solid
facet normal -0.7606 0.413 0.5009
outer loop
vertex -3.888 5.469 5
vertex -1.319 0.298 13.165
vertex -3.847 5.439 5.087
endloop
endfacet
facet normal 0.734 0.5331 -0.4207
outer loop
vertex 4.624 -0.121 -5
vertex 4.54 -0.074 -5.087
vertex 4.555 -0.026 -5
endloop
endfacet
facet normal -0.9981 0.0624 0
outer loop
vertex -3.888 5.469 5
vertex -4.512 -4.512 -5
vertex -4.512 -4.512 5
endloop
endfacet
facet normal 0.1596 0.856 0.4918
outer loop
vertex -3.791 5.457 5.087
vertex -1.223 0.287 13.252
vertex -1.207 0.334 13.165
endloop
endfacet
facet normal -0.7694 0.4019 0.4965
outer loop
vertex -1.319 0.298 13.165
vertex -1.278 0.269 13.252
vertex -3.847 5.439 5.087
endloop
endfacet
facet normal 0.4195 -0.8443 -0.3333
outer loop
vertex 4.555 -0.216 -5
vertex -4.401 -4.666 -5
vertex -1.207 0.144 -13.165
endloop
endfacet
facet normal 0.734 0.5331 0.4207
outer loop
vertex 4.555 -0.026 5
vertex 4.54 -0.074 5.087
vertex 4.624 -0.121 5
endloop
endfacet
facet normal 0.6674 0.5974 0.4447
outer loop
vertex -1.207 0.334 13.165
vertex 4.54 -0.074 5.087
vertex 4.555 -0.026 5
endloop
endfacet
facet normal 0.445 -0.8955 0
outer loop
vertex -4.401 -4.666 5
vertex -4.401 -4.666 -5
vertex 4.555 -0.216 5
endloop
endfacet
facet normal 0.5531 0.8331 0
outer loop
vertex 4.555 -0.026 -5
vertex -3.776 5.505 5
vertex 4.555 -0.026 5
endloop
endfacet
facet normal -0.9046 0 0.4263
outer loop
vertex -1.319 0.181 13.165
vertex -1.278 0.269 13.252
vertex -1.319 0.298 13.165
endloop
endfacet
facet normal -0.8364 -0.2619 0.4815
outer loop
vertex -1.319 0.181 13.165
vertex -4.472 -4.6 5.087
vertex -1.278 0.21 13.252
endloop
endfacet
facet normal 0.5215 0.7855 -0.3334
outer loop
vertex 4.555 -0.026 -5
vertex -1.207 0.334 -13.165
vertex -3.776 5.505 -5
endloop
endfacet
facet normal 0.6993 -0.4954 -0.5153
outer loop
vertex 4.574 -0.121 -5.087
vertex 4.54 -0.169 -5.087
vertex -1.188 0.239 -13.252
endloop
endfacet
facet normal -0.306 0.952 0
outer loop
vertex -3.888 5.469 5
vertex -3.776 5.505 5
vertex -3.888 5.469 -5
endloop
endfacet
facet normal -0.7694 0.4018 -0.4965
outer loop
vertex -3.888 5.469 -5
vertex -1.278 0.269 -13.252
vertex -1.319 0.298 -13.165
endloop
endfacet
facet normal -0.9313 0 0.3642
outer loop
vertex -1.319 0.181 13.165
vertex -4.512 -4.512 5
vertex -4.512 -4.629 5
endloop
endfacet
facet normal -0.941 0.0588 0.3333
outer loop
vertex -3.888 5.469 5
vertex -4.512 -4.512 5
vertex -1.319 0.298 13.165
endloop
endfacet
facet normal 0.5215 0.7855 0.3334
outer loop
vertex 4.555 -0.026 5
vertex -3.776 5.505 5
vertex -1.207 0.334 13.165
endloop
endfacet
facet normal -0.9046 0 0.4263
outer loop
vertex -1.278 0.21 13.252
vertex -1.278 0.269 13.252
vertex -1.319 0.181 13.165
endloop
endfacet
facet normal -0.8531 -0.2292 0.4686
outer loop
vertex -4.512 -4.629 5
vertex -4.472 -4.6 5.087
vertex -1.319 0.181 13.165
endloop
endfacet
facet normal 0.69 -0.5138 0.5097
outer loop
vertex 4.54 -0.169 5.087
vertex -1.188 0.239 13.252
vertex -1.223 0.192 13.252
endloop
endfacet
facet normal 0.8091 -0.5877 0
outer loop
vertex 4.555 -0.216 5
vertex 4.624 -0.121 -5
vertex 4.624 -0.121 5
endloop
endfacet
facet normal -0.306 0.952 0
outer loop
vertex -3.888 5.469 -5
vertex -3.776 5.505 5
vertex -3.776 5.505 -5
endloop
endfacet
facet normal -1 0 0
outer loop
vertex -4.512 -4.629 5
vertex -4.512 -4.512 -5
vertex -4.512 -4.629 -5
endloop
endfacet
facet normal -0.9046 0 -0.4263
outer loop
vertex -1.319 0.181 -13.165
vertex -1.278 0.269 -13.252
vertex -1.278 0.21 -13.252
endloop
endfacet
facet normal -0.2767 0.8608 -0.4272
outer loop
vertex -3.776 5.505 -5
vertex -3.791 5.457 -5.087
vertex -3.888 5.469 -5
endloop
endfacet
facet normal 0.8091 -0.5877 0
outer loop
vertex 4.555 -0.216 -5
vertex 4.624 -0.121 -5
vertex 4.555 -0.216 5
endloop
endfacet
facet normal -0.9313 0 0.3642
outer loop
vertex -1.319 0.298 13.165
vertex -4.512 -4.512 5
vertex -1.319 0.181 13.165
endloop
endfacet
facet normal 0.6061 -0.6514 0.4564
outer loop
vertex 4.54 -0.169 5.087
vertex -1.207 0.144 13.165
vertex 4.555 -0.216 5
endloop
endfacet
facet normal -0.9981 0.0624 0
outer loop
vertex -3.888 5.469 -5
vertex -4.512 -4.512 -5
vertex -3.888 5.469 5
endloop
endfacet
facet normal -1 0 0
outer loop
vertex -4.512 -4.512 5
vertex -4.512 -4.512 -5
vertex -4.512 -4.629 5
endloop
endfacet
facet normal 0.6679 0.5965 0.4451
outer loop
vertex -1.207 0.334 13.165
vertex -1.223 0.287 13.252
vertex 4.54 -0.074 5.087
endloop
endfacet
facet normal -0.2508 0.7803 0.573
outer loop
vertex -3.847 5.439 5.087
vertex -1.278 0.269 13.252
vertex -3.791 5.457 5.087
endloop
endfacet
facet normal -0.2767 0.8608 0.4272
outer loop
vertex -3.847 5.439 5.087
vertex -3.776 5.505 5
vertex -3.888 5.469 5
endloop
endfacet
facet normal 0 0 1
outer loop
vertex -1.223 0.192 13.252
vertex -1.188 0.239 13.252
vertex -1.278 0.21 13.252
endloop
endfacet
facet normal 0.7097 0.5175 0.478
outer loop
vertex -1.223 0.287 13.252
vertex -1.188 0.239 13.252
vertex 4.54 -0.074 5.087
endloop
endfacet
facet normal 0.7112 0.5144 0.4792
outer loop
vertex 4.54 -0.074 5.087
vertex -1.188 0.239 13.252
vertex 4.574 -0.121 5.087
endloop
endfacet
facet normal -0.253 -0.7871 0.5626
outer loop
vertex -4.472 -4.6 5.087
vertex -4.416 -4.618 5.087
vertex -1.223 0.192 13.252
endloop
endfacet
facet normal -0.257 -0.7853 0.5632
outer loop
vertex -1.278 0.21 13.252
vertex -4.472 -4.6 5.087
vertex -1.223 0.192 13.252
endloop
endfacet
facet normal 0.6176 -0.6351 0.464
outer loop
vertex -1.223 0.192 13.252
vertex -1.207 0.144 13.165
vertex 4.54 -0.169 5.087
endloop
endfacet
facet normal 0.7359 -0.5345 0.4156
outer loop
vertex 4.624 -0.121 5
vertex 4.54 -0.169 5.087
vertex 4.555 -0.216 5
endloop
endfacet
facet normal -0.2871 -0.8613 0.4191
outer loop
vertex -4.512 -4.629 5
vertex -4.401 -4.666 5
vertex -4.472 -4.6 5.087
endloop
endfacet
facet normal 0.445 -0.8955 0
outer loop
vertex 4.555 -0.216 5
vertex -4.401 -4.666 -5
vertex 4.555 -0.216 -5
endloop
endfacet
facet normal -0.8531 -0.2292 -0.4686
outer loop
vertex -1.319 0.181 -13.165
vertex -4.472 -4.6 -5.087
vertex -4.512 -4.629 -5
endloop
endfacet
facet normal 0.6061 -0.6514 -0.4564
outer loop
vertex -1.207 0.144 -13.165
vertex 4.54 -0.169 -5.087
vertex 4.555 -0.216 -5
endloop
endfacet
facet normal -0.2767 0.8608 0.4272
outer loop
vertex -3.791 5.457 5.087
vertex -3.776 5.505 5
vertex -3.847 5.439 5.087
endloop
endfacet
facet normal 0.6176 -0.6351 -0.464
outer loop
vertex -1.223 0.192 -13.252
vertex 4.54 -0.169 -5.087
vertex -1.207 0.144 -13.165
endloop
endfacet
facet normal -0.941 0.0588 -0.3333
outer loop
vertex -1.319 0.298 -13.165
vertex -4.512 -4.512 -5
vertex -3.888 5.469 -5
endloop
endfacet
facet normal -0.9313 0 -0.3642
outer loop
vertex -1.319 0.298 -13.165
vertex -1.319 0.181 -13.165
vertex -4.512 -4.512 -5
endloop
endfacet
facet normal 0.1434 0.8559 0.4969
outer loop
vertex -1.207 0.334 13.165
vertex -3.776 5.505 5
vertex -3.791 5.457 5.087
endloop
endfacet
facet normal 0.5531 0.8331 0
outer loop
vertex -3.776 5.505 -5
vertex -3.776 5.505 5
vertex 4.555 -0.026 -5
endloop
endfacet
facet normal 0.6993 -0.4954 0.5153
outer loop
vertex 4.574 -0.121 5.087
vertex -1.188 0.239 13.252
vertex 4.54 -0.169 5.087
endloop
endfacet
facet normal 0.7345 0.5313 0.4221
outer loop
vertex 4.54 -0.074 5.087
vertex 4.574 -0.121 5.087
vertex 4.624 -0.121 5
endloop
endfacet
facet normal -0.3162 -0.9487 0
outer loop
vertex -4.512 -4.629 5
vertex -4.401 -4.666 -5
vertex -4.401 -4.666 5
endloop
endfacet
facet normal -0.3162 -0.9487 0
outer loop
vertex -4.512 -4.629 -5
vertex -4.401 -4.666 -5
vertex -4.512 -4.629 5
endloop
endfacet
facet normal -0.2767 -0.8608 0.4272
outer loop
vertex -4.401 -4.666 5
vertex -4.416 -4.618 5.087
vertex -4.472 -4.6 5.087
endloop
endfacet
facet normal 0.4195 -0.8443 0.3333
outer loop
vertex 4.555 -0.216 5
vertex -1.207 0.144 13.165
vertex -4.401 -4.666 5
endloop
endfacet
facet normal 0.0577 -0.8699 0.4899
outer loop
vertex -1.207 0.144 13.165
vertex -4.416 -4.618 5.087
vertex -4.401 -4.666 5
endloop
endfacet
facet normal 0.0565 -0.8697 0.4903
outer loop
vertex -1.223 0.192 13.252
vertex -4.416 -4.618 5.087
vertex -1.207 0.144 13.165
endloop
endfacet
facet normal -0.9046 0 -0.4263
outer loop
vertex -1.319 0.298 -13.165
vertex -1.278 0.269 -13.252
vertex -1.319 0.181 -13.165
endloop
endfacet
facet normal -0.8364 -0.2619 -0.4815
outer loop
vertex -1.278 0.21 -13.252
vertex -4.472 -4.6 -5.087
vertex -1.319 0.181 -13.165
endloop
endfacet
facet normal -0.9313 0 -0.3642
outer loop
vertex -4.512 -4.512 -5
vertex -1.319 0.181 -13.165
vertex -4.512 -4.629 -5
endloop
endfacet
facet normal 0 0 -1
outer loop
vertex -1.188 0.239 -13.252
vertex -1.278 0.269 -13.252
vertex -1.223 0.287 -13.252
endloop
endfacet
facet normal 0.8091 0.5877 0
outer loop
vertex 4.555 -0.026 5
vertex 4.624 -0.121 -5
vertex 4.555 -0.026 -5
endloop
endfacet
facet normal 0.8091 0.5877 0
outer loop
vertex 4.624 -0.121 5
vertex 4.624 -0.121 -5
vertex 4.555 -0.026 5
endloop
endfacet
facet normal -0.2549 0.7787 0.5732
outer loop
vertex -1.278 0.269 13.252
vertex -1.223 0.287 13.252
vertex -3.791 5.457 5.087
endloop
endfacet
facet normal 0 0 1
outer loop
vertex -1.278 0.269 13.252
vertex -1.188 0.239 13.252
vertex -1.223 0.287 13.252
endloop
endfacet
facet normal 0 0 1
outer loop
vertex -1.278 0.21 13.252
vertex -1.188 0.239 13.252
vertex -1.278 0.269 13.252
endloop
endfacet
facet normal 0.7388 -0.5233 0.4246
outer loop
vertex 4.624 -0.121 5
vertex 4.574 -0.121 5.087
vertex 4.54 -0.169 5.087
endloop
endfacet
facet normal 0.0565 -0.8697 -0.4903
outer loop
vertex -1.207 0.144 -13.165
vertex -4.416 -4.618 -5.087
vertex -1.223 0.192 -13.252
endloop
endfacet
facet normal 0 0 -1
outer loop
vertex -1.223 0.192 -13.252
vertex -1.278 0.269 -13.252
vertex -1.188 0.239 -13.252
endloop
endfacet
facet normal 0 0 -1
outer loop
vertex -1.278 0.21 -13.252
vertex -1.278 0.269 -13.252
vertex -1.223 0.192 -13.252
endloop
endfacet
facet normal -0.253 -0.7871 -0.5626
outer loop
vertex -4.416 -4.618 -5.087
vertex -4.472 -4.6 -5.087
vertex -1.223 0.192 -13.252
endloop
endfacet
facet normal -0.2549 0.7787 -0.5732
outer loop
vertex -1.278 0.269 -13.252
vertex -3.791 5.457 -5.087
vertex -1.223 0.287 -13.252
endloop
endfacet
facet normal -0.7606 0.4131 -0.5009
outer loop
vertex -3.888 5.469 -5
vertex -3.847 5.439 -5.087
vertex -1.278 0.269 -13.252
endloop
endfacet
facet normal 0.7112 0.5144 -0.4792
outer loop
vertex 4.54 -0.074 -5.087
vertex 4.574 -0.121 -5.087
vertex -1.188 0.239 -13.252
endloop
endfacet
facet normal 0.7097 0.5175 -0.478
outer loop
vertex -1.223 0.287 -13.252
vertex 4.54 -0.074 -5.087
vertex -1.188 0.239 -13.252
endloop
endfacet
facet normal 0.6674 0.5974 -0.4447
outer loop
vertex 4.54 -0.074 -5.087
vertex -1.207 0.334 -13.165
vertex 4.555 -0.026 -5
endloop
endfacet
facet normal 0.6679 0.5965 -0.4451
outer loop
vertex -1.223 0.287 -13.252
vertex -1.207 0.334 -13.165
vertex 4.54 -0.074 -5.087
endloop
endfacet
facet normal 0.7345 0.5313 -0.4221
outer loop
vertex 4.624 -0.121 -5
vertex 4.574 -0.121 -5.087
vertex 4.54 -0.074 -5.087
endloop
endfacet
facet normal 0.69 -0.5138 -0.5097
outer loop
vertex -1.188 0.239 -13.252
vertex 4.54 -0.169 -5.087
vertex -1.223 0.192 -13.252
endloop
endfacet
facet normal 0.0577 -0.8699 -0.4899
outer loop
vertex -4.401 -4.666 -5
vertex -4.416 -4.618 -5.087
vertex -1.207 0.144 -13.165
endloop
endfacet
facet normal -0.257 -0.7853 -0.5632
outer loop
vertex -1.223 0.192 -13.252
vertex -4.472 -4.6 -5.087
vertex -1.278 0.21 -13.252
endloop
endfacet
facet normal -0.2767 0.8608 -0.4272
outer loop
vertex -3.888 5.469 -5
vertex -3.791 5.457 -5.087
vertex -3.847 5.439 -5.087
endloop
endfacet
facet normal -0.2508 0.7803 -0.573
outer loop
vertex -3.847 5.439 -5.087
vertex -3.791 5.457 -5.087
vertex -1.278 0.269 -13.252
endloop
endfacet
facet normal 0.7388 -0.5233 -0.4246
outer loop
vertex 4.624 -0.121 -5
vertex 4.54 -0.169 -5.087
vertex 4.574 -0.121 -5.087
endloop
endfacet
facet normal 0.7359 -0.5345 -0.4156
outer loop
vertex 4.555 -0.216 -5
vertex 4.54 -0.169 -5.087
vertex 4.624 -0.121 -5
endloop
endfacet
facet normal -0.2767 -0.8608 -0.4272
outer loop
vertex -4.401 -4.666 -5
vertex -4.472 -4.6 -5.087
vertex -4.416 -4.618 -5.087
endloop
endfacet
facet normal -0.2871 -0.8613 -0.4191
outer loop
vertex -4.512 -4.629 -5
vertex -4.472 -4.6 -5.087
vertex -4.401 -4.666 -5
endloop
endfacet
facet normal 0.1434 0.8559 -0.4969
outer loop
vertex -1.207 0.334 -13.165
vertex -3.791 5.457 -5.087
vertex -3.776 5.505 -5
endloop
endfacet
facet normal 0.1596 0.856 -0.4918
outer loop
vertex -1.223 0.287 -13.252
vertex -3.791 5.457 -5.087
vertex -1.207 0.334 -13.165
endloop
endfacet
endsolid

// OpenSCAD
// Auto-generated OpenSCAD file

    inner_points = 10*[[-0.4431428263878504, -0.4570616481590885, 0.5000000000000111], [-0.4431428263878677, -0.4570616481591002, -0.49999999999998884], [-0.38067743121914766, 0.5409854821941918, 0.4999999999999984], [-0.3806774312191651, 0.5409854821941802, -0.5000000000000016], [0.452424040256601, -0.012134702055978608, 0.49999999999999045], [0.45242404025658345, -0.012134702055990293, -0.5000000000000095], [-0.12379873911678495, 0.023929710659717798, 1.316496580927726], [-0.12379873911683055, 0.023929710659686996, -1.316496580927726]];

    outer_points = 10*[[-0.49420916328855335, 0.48885165398079056, -0.3164090653808874], [-0.4949038486176348, -0.5104484675685688, -0.27900873805973586], [0.505618378810838, 0.48885165398079056, -0.2978379571886004], [0.5049236934817566, -0.5104484675685688, -0.26043762986744884], [-0.01036718752866248, 0.5212468743624579, 0.5581465315877604], [-0.011061872857743975, -0.4780532471869015, 0.5955468589089121], [0.0009145508605564383, 1.3155751933403925, -0.0492374030438739], [-0.0009145508605564383, -1.3155751933403925, 0.0492374030438739]];

    // Convex hull for inner set (I)
    module inner_hull() {
        hull() {
            for (p = inner_points) {
                translate(p) sphere(r=0.1);
            }
        }
    }

    // Convex hull for outer set (O) minus inner hull (O \ I)
    module outer_minus_inner() {
        difference() {
            hull() {
                for (p = outer_points) {
                    translate(p) sphere(r=0.1);
                }
            }
            inner_hull(); // Subtract inner hull
        }
    }

    // Convex hull for outer set (O) minus all translated inner hulls
    module outer_minus_AllTranslationInner() {
        difference() {
            hull() {
                for (p = outer_points) {
                    translate(p) sphere(r=0.1);
                }
            }
            hull() {
                translate([0,0,50]) inner_hull();
                translate([0,0,-50]) inner_hull();
            }; // Subtract translated inner hulls
        }
    }

    // Difference between outer_minus_inner and outer_minus_AllTranslationInner
    module outer_minus_inner_diff() {
        difference() {
            // Outer minus inner
            difference() {
                hull() {
                    for (p = outer_points) {
                        translate(p) sphere(r=0.1);
                    }
                }
                inner_hull();
            }

            // Subtract Outer minus AllTranslationInner
            difference() {
                hull() {
                    for (p = outer_points) {
                        translate(p) sphere(r=0.1);
                    }
                }
                hull() {
                    translate([0,0,50]) inner_hull();
                    translate([0,0,-50]) inner_hull();
                };
            }
        }
    }

    // Rendering all with colors applied
    color([1, 0, 0, 0.5]) inner_hull(); // Transparent red
    
